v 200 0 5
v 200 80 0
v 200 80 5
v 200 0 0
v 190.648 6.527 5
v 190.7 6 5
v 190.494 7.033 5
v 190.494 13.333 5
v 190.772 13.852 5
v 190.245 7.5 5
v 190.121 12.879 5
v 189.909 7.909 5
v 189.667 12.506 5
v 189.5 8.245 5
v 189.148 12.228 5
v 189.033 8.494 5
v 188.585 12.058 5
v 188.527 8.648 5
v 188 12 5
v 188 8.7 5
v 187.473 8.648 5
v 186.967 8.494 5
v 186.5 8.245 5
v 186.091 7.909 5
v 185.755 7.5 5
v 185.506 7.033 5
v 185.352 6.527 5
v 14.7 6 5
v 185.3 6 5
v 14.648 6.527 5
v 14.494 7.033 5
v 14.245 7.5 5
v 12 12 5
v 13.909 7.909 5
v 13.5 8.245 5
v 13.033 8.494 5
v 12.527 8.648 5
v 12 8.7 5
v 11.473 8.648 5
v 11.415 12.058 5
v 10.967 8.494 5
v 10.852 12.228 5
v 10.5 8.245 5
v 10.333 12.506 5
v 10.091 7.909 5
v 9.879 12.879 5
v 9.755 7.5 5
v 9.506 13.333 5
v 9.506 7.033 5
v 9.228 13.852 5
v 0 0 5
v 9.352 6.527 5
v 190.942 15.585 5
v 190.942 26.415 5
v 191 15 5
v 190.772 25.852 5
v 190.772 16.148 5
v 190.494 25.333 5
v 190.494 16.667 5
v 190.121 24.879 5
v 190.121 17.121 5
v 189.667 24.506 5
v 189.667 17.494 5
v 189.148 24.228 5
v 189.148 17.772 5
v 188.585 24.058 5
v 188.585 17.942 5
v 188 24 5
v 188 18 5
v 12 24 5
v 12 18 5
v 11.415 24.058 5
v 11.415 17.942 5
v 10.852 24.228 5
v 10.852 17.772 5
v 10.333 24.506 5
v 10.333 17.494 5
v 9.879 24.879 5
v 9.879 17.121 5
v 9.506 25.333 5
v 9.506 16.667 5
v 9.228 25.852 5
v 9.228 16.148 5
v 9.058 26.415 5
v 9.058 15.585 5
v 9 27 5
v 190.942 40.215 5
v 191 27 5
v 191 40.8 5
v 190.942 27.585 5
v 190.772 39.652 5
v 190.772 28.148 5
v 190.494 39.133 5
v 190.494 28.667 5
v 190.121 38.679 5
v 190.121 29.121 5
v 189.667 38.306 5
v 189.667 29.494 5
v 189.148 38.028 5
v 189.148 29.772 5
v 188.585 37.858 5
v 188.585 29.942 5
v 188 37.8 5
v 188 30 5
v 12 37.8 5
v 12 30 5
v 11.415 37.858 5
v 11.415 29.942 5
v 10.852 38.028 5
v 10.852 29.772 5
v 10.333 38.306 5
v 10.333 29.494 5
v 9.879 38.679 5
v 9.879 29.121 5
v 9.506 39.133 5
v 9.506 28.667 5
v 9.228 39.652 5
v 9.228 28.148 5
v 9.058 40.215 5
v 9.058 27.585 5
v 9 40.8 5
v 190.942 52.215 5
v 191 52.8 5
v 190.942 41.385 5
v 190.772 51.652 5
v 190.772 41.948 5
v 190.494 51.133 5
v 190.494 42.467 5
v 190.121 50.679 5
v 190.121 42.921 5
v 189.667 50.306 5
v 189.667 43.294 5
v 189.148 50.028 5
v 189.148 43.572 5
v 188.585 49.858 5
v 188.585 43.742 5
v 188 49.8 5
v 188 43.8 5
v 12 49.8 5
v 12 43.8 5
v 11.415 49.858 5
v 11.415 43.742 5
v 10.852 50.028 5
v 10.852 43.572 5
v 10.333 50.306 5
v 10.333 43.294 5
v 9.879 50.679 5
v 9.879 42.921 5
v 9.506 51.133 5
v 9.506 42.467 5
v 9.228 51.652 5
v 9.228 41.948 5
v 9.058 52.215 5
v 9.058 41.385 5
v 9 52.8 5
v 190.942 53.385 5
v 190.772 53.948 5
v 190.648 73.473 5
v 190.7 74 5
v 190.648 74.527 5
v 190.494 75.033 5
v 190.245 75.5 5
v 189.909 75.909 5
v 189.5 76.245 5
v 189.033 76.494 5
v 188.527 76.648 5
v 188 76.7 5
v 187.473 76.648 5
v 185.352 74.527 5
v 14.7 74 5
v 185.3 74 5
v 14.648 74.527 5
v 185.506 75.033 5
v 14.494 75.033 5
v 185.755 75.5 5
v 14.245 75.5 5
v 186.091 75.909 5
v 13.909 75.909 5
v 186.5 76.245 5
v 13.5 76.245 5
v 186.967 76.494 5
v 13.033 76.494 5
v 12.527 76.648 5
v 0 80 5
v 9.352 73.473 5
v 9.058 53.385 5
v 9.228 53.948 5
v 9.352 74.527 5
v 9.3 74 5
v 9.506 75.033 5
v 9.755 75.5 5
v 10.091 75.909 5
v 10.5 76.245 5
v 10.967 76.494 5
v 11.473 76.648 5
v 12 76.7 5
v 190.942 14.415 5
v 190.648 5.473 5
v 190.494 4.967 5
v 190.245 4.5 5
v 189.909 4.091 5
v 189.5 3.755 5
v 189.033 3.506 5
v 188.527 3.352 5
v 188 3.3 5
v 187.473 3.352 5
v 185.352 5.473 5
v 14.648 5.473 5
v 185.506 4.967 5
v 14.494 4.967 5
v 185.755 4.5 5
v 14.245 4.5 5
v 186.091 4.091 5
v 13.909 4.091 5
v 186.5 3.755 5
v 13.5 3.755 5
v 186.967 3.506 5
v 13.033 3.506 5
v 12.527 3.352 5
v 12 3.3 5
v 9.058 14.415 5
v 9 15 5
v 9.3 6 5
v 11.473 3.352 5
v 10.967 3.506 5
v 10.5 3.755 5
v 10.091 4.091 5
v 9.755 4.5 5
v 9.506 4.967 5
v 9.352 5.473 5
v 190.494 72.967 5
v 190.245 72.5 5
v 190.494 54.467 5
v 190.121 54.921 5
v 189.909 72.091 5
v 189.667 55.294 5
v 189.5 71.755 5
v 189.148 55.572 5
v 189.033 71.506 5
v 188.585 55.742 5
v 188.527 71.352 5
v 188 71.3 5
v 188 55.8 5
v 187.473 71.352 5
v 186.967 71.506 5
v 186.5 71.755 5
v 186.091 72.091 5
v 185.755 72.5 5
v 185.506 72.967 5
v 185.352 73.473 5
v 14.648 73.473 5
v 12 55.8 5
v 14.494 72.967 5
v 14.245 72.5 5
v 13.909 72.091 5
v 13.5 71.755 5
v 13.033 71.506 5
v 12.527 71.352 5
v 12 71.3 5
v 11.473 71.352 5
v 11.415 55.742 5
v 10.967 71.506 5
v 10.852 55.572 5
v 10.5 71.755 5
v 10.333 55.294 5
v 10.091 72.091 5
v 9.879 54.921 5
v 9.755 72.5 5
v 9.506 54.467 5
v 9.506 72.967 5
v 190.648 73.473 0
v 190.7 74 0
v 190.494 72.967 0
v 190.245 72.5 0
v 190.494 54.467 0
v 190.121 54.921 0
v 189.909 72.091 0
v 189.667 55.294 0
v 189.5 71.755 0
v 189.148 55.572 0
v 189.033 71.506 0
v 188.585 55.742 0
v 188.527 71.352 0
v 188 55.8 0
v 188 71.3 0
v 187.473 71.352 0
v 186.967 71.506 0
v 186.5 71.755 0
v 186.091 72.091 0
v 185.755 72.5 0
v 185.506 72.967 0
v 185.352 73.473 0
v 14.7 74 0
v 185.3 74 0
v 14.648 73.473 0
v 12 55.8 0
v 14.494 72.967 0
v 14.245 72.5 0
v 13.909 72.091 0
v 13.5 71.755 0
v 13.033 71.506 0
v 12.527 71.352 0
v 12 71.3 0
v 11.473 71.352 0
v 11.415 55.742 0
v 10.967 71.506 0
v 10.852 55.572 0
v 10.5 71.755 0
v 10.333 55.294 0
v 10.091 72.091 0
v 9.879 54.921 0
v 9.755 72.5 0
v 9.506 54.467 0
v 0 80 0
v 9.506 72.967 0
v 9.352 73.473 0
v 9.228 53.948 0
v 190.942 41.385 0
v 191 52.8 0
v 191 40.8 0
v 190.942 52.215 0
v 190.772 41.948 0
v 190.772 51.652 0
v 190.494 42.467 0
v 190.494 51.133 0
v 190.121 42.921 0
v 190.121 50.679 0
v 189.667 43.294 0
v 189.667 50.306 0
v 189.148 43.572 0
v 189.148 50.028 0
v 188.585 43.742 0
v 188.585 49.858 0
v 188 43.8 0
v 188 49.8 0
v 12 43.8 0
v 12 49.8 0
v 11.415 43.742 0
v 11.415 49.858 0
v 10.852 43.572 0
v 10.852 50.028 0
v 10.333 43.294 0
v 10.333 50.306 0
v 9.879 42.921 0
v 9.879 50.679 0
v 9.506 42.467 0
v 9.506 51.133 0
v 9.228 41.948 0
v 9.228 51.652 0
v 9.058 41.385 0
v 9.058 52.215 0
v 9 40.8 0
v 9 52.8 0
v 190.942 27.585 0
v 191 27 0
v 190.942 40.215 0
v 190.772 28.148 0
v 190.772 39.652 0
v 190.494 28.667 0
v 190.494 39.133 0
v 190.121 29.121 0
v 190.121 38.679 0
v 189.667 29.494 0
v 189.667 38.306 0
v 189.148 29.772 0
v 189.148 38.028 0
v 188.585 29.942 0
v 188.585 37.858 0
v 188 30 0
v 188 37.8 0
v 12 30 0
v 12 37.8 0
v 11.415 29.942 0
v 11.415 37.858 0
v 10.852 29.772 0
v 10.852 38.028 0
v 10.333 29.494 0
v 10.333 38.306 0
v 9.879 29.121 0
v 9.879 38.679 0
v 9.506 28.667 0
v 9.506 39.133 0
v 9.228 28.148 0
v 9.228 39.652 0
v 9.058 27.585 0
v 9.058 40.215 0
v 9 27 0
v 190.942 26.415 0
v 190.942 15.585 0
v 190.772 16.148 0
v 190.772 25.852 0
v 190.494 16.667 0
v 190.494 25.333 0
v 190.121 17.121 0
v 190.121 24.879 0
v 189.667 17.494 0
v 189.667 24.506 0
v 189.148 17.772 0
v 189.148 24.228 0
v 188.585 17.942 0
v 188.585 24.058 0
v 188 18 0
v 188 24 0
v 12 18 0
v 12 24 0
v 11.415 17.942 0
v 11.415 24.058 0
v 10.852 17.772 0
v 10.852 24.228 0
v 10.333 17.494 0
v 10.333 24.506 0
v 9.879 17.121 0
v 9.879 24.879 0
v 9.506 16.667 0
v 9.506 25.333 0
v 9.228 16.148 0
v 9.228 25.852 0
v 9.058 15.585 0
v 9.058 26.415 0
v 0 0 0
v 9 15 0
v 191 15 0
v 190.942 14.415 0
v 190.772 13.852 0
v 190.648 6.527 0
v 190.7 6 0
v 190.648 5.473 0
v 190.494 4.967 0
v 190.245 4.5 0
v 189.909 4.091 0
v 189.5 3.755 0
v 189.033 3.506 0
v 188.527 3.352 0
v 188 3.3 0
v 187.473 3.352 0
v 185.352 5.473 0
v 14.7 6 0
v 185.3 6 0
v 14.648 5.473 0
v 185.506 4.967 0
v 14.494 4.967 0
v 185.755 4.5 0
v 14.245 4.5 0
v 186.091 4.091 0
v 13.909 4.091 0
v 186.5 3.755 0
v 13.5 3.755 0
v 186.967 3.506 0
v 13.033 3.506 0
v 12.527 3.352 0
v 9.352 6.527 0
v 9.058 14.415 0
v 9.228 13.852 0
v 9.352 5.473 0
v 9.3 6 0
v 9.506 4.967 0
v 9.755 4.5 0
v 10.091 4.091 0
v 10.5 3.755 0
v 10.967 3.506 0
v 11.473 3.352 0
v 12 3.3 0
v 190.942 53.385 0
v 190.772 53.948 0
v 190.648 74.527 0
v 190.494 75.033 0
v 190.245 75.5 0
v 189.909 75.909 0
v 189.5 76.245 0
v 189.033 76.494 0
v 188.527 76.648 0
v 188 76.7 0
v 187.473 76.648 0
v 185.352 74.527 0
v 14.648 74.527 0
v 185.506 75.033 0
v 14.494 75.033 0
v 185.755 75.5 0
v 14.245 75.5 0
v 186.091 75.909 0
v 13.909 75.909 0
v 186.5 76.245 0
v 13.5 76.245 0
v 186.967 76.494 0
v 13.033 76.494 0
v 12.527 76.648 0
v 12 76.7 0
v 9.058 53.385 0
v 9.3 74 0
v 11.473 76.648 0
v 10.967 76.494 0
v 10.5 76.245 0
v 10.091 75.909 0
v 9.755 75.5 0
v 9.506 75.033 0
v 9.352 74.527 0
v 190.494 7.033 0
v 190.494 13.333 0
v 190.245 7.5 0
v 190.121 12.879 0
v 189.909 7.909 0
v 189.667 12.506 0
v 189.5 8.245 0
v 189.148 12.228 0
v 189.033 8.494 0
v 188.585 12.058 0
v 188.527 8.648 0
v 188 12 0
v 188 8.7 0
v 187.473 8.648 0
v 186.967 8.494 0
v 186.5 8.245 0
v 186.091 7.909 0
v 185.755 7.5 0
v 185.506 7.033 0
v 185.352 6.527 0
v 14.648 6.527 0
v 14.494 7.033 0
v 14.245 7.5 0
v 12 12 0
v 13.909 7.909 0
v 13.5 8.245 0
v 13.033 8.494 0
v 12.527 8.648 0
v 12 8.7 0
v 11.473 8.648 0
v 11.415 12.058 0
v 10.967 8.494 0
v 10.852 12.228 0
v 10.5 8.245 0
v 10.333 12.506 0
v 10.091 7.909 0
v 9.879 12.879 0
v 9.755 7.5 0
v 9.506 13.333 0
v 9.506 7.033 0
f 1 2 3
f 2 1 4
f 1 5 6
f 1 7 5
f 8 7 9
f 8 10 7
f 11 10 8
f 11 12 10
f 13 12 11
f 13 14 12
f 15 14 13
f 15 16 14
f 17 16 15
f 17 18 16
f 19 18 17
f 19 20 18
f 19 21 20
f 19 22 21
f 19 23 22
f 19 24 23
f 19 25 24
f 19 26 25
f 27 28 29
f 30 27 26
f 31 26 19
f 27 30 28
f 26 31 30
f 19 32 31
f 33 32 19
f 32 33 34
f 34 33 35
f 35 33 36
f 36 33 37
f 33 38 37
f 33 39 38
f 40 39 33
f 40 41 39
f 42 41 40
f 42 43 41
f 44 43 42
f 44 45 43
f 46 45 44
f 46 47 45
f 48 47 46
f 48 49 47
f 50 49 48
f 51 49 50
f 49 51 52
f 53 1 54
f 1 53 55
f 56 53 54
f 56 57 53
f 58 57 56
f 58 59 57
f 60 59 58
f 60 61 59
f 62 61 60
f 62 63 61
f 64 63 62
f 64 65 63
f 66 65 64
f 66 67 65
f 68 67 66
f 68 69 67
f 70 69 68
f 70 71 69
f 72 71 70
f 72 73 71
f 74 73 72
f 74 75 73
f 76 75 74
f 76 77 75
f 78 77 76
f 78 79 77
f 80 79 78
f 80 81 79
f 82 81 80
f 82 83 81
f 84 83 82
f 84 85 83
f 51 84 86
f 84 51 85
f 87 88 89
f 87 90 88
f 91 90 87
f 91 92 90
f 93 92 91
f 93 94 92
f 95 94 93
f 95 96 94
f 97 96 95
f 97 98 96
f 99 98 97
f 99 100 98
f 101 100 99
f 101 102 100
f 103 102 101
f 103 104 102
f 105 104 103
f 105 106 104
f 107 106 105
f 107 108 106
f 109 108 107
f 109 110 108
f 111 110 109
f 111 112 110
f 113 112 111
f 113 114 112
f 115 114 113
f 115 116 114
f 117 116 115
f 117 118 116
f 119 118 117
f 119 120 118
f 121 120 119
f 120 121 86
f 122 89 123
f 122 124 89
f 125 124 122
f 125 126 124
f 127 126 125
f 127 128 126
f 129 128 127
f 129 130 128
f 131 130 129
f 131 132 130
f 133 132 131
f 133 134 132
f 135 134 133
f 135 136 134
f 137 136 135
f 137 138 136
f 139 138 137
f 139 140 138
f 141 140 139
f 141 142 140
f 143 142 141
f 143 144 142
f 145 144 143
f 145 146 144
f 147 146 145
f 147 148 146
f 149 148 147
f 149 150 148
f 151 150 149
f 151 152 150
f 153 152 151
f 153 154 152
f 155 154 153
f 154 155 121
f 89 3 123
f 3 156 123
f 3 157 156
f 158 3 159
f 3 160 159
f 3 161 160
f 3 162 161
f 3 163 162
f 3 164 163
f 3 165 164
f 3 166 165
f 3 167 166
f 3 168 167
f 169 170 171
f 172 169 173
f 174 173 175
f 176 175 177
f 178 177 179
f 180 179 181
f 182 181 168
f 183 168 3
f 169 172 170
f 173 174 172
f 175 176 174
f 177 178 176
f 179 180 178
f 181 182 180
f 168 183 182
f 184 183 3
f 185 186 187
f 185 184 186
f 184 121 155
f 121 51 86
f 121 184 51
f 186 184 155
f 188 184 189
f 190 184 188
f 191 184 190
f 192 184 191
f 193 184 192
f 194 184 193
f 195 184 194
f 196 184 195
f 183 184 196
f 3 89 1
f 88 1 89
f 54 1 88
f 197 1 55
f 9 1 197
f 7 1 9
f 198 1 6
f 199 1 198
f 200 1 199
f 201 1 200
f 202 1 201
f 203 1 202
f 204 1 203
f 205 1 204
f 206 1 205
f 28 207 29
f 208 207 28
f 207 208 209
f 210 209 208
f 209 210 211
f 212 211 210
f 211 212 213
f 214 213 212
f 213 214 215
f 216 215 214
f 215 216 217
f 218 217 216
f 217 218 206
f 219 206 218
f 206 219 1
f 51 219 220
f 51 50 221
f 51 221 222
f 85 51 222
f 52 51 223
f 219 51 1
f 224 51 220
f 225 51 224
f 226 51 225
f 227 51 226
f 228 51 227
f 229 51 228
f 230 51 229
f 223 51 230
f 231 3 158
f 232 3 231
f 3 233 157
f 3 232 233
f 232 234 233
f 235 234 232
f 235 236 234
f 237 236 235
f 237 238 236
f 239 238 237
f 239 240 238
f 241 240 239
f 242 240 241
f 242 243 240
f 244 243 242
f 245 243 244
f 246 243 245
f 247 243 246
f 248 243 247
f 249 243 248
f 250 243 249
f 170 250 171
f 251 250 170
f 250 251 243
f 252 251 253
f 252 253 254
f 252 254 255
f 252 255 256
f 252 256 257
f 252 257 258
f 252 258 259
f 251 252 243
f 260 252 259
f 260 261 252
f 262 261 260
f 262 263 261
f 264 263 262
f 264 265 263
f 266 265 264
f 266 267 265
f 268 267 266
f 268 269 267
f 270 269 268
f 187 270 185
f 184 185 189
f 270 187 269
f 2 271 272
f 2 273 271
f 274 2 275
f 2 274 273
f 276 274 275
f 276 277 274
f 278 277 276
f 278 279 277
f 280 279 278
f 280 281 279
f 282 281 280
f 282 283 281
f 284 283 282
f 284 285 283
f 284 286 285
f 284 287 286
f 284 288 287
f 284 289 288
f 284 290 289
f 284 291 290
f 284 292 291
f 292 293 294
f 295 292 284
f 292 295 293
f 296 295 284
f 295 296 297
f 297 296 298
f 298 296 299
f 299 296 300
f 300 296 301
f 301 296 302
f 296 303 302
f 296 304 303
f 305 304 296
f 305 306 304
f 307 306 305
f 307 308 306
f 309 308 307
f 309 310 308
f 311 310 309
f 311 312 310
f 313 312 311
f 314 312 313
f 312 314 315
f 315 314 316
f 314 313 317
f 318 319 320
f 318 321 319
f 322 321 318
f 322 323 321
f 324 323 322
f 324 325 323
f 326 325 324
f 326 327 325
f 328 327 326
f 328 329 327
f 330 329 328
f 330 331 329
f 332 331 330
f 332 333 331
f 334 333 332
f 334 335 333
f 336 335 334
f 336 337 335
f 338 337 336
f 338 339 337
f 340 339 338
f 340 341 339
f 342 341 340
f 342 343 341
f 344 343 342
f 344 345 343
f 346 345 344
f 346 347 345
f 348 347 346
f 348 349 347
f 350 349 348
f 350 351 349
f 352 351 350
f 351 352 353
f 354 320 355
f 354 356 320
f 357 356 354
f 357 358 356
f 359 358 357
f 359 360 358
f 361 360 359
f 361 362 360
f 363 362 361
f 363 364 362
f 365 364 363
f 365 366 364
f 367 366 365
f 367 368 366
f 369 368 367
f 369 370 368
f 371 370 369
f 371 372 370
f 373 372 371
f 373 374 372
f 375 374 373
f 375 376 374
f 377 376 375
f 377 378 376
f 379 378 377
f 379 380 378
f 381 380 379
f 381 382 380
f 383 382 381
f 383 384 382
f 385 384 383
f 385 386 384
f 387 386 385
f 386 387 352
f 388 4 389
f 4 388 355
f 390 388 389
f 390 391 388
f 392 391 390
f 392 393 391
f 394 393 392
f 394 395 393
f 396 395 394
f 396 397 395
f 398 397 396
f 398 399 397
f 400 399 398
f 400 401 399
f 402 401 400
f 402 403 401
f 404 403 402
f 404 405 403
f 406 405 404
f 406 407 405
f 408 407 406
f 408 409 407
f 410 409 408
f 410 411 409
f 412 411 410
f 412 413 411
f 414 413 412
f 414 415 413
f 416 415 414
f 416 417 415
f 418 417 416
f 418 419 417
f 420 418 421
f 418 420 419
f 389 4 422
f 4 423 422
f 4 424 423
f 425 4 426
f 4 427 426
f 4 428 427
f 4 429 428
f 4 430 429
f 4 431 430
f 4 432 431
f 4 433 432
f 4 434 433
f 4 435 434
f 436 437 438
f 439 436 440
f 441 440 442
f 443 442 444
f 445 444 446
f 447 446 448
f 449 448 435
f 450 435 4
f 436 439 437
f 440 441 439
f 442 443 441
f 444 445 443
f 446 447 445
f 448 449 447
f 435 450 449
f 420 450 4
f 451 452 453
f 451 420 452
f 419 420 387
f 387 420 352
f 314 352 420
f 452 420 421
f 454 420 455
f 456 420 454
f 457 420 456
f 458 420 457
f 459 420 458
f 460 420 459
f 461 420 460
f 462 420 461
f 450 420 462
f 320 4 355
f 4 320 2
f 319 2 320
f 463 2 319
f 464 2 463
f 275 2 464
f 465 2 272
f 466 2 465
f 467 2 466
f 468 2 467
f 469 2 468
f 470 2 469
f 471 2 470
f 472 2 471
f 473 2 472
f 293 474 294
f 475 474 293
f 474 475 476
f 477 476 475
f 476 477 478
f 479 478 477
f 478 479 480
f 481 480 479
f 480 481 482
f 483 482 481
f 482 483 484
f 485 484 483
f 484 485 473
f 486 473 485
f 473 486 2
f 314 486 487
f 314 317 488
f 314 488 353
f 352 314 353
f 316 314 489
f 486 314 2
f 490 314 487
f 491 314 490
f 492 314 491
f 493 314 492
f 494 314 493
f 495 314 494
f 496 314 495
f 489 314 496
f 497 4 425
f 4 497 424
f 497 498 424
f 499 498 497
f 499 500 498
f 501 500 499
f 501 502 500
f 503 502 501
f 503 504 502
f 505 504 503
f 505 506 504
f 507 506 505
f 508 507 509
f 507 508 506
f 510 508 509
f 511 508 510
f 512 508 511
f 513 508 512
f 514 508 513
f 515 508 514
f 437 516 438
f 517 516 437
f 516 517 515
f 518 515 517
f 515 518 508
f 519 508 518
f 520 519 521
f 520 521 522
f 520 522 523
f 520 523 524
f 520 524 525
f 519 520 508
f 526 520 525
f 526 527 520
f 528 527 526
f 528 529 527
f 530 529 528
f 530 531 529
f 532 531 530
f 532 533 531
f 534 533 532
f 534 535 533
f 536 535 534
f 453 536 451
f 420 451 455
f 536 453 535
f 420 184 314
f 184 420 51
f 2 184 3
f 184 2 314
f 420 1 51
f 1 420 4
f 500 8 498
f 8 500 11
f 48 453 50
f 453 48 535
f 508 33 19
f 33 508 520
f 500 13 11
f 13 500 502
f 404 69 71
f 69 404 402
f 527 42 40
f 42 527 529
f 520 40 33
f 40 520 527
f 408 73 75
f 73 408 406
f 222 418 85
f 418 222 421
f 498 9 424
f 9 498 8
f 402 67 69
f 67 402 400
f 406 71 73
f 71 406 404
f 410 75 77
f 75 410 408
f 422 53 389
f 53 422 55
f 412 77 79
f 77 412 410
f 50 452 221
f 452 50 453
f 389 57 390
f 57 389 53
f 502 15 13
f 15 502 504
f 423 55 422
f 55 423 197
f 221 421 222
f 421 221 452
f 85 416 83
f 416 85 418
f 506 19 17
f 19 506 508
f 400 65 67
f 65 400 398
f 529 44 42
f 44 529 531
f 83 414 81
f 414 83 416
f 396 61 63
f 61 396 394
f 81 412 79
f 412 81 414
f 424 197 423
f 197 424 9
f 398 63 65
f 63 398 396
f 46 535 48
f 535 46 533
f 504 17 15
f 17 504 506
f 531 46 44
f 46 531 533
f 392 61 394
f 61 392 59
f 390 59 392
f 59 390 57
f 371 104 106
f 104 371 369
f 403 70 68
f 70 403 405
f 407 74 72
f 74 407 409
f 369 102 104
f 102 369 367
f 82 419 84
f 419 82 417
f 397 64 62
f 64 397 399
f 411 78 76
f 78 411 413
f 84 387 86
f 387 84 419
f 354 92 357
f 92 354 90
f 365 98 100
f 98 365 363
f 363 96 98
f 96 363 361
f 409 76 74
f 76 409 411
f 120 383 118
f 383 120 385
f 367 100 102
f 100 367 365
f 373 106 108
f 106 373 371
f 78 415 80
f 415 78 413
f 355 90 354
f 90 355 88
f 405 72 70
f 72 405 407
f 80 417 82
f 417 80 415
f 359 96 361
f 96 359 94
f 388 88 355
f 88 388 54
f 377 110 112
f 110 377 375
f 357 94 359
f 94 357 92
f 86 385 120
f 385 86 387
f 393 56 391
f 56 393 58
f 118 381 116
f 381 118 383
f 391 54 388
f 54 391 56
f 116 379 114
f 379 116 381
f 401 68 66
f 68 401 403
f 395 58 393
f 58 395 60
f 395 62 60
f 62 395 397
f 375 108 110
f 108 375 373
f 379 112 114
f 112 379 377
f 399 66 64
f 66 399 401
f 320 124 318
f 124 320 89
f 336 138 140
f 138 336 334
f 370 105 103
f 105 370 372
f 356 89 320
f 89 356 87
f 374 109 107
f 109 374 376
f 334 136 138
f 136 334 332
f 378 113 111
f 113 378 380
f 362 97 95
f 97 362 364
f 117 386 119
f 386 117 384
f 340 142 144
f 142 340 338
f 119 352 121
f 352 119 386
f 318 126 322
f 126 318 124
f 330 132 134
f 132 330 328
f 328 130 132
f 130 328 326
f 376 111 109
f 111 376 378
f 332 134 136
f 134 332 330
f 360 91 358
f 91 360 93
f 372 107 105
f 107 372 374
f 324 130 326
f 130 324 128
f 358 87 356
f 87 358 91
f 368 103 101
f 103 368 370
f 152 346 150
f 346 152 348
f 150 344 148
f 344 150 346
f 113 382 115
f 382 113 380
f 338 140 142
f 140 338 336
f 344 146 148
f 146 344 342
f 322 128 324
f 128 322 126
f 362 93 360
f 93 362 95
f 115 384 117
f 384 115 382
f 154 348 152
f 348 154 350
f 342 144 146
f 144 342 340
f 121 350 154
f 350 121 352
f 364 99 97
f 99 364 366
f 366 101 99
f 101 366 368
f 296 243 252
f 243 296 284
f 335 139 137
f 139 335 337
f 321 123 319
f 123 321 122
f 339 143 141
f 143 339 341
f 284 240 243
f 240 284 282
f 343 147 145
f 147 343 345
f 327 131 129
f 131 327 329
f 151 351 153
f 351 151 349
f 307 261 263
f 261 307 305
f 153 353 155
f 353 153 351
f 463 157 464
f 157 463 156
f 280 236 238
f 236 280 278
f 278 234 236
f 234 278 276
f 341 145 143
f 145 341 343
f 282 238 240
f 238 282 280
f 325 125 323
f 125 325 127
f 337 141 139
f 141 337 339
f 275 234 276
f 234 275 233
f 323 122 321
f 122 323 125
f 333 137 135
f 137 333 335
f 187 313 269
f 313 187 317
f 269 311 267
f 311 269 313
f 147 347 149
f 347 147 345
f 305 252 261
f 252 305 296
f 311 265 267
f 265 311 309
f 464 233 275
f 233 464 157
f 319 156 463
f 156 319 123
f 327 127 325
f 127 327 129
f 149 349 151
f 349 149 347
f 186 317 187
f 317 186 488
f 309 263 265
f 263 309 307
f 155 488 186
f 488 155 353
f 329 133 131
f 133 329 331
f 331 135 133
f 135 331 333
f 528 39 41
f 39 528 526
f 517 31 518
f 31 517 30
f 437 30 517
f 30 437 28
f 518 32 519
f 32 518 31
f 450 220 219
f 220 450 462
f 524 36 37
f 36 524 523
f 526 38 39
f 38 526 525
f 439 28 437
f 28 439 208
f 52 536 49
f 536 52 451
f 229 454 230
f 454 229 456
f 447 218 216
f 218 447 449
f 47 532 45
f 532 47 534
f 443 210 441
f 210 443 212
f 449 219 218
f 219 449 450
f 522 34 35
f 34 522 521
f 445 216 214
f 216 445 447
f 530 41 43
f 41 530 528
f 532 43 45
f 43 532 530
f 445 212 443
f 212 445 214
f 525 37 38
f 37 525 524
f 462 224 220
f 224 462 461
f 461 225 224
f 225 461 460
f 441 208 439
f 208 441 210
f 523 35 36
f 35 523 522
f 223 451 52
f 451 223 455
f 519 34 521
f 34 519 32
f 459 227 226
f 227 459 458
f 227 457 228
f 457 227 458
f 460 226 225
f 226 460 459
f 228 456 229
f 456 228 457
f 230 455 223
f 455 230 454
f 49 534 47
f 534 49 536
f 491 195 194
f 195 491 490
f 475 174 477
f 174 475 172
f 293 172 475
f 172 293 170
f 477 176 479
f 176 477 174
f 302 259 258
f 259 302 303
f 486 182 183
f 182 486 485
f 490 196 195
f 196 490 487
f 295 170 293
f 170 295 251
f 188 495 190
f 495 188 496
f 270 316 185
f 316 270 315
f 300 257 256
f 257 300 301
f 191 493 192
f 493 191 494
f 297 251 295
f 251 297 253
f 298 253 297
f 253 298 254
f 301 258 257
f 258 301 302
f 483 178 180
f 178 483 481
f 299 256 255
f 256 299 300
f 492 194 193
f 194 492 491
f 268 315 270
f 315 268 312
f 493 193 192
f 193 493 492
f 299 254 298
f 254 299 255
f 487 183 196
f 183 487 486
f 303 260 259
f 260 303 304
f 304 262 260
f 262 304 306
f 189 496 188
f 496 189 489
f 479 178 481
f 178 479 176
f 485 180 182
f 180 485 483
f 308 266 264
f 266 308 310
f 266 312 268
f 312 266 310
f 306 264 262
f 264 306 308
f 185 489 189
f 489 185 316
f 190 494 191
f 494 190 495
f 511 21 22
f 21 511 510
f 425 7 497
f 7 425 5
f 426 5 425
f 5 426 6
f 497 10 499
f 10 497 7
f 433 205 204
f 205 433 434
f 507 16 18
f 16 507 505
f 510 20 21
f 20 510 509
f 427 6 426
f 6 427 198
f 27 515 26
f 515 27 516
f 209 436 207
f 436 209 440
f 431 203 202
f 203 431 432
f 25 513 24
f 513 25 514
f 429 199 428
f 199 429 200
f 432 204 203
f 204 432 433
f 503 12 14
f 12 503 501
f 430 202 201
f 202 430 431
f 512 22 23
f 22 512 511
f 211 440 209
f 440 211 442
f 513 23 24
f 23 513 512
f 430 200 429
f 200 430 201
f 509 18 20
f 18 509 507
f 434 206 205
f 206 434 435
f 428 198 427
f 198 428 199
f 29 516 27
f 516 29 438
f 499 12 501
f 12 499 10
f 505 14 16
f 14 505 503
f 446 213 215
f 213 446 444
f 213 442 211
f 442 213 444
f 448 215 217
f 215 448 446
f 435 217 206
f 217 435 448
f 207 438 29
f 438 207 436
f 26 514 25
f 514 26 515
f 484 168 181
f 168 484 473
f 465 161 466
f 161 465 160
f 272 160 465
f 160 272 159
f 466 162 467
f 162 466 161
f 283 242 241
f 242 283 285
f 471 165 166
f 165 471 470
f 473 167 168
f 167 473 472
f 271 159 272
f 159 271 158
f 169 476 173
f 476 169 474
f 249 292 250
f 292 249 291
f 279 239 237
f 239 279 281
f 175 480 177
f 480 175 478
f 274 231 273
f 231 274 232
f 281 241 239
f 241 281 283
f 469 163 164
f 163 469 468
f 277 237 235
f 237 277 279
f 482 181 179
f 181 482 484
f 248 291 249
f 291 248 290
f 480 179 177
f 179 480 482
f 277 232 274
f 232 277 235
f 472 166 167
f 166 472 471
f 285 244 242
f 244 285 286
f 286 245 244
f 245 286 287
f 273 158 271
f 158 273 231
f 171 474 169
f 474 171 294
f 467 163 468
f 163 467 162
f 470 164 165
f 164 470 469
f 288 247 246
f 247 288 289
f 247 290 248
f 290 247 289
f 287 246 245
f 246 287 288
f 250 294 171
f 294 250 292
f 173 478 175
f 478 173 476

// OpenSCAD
$fn = 32;

// ----------------------------------------------------------------------
// Slotted panel: 200 x 80 mm, 4 ряда of slots
// ----------------------------------------------------------------------

// --- parameters (mm) ---
panel_w = 200;            // panel width
panel_d = 80;             // panel depth
thick = 5;                // panel thickness
slot_w = 6;               // slot width
pitch0 = 12;              // first row pitch
pitch_step = 1.8;         // pitch increase per row
margin = 12;              // margin around the slot field
rows = 4;                 // number of slot rows
mount_d = 5.4;            // mounting holes
mount_x = 88;             // mounting hole offset

difference() {
  union() {
    cube([panel_w, panel_d, thick]);
  }
  /* slot rows: stadium shaped cutters, 2.5 mm clear of both faces */
  /* row 0: pitch 12, length 176 */
  hull() {
    translate([12, 15, -2.5]) cylinder(h = thick + 5, d = slot_w);
    translate([188, 15, -2.5]) cylinder(h = thick + 5, d = slot_w);
  }
  /* row 1: pitch 13.8, length 176 */
  hull() {
    translate([12, 27, -2.5]) cylinder(h = thick + 5, d = slot_w);
    translate([188, 27, -2.5]) cylinder(h = thick + 5, d = slot_w);
  }
  /* row 2: pitch 12, length 176 */
  hull() {
    translate([12, 40.8, -2.5]) cylinder(h = thick + 5, d = slot_w);
    translate([188, 40.8, -2.5]) cylinder(h = thick + 5, d = slot_w);
  }
  /* row 3: pitch 13.8, length 176 */
  hull() {
    translate([12, 52.8, -2.5]) cylinder(h = thick + 5, d = slot_w);
    translate([188, 52.8, -2.5]) cylinder(h = thick + 5, d = slot_w);
  }
  translate([12, 6, -2.5]) cylinder(h = 10, d = mount_d);
  translate([12, 74, -2.5]) cylinder(h = 10, d = mount_d);
  translate([188, 6, -2.5]) cylinder(h = 10, d = mount_d);
  translate([188, 74, -2.5]) cylinder(h = 10, d = mount_d);
}
